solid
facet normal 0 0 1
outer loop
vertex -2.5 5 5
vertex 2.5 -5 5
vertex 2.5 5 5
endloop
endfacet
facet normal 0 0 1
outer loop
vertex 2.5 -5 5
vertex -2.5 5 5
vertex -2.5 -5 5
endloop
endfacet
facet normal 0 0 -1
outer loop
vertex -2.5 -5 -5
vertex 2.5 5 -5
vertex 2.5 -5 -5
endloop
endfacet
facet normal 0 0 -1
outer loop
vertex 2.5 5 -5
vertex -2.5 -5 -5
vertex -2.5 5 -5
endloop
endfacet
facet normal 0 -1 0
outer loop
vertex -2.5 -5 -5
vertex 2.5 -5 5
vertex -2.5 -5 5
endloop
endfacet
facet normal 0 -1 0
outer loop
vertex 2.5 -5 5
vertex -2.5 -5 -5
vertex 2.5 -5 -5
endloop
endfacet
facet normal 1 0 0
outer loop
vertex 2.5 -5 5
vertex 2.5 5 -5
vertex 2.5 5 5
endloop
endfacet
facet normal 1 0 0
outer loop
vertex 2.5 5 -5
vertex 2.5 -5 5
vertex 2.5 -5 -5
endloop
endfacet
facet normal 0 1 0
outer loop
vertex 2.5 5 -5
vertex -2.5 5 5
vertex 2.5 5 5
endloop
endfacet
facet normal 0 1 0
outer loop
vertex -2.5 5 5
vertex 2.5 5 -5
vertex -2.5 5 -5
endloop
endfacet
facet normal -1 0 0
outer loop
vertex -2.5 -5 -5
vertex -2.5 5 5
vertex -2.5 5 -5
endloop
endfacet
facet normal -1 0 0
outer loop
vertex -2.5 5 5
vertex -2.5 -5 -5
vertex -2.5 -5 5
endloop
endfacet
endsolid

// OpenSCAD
// Generated by generate_scads.py
cube(size=[5,10,10], center=true);
